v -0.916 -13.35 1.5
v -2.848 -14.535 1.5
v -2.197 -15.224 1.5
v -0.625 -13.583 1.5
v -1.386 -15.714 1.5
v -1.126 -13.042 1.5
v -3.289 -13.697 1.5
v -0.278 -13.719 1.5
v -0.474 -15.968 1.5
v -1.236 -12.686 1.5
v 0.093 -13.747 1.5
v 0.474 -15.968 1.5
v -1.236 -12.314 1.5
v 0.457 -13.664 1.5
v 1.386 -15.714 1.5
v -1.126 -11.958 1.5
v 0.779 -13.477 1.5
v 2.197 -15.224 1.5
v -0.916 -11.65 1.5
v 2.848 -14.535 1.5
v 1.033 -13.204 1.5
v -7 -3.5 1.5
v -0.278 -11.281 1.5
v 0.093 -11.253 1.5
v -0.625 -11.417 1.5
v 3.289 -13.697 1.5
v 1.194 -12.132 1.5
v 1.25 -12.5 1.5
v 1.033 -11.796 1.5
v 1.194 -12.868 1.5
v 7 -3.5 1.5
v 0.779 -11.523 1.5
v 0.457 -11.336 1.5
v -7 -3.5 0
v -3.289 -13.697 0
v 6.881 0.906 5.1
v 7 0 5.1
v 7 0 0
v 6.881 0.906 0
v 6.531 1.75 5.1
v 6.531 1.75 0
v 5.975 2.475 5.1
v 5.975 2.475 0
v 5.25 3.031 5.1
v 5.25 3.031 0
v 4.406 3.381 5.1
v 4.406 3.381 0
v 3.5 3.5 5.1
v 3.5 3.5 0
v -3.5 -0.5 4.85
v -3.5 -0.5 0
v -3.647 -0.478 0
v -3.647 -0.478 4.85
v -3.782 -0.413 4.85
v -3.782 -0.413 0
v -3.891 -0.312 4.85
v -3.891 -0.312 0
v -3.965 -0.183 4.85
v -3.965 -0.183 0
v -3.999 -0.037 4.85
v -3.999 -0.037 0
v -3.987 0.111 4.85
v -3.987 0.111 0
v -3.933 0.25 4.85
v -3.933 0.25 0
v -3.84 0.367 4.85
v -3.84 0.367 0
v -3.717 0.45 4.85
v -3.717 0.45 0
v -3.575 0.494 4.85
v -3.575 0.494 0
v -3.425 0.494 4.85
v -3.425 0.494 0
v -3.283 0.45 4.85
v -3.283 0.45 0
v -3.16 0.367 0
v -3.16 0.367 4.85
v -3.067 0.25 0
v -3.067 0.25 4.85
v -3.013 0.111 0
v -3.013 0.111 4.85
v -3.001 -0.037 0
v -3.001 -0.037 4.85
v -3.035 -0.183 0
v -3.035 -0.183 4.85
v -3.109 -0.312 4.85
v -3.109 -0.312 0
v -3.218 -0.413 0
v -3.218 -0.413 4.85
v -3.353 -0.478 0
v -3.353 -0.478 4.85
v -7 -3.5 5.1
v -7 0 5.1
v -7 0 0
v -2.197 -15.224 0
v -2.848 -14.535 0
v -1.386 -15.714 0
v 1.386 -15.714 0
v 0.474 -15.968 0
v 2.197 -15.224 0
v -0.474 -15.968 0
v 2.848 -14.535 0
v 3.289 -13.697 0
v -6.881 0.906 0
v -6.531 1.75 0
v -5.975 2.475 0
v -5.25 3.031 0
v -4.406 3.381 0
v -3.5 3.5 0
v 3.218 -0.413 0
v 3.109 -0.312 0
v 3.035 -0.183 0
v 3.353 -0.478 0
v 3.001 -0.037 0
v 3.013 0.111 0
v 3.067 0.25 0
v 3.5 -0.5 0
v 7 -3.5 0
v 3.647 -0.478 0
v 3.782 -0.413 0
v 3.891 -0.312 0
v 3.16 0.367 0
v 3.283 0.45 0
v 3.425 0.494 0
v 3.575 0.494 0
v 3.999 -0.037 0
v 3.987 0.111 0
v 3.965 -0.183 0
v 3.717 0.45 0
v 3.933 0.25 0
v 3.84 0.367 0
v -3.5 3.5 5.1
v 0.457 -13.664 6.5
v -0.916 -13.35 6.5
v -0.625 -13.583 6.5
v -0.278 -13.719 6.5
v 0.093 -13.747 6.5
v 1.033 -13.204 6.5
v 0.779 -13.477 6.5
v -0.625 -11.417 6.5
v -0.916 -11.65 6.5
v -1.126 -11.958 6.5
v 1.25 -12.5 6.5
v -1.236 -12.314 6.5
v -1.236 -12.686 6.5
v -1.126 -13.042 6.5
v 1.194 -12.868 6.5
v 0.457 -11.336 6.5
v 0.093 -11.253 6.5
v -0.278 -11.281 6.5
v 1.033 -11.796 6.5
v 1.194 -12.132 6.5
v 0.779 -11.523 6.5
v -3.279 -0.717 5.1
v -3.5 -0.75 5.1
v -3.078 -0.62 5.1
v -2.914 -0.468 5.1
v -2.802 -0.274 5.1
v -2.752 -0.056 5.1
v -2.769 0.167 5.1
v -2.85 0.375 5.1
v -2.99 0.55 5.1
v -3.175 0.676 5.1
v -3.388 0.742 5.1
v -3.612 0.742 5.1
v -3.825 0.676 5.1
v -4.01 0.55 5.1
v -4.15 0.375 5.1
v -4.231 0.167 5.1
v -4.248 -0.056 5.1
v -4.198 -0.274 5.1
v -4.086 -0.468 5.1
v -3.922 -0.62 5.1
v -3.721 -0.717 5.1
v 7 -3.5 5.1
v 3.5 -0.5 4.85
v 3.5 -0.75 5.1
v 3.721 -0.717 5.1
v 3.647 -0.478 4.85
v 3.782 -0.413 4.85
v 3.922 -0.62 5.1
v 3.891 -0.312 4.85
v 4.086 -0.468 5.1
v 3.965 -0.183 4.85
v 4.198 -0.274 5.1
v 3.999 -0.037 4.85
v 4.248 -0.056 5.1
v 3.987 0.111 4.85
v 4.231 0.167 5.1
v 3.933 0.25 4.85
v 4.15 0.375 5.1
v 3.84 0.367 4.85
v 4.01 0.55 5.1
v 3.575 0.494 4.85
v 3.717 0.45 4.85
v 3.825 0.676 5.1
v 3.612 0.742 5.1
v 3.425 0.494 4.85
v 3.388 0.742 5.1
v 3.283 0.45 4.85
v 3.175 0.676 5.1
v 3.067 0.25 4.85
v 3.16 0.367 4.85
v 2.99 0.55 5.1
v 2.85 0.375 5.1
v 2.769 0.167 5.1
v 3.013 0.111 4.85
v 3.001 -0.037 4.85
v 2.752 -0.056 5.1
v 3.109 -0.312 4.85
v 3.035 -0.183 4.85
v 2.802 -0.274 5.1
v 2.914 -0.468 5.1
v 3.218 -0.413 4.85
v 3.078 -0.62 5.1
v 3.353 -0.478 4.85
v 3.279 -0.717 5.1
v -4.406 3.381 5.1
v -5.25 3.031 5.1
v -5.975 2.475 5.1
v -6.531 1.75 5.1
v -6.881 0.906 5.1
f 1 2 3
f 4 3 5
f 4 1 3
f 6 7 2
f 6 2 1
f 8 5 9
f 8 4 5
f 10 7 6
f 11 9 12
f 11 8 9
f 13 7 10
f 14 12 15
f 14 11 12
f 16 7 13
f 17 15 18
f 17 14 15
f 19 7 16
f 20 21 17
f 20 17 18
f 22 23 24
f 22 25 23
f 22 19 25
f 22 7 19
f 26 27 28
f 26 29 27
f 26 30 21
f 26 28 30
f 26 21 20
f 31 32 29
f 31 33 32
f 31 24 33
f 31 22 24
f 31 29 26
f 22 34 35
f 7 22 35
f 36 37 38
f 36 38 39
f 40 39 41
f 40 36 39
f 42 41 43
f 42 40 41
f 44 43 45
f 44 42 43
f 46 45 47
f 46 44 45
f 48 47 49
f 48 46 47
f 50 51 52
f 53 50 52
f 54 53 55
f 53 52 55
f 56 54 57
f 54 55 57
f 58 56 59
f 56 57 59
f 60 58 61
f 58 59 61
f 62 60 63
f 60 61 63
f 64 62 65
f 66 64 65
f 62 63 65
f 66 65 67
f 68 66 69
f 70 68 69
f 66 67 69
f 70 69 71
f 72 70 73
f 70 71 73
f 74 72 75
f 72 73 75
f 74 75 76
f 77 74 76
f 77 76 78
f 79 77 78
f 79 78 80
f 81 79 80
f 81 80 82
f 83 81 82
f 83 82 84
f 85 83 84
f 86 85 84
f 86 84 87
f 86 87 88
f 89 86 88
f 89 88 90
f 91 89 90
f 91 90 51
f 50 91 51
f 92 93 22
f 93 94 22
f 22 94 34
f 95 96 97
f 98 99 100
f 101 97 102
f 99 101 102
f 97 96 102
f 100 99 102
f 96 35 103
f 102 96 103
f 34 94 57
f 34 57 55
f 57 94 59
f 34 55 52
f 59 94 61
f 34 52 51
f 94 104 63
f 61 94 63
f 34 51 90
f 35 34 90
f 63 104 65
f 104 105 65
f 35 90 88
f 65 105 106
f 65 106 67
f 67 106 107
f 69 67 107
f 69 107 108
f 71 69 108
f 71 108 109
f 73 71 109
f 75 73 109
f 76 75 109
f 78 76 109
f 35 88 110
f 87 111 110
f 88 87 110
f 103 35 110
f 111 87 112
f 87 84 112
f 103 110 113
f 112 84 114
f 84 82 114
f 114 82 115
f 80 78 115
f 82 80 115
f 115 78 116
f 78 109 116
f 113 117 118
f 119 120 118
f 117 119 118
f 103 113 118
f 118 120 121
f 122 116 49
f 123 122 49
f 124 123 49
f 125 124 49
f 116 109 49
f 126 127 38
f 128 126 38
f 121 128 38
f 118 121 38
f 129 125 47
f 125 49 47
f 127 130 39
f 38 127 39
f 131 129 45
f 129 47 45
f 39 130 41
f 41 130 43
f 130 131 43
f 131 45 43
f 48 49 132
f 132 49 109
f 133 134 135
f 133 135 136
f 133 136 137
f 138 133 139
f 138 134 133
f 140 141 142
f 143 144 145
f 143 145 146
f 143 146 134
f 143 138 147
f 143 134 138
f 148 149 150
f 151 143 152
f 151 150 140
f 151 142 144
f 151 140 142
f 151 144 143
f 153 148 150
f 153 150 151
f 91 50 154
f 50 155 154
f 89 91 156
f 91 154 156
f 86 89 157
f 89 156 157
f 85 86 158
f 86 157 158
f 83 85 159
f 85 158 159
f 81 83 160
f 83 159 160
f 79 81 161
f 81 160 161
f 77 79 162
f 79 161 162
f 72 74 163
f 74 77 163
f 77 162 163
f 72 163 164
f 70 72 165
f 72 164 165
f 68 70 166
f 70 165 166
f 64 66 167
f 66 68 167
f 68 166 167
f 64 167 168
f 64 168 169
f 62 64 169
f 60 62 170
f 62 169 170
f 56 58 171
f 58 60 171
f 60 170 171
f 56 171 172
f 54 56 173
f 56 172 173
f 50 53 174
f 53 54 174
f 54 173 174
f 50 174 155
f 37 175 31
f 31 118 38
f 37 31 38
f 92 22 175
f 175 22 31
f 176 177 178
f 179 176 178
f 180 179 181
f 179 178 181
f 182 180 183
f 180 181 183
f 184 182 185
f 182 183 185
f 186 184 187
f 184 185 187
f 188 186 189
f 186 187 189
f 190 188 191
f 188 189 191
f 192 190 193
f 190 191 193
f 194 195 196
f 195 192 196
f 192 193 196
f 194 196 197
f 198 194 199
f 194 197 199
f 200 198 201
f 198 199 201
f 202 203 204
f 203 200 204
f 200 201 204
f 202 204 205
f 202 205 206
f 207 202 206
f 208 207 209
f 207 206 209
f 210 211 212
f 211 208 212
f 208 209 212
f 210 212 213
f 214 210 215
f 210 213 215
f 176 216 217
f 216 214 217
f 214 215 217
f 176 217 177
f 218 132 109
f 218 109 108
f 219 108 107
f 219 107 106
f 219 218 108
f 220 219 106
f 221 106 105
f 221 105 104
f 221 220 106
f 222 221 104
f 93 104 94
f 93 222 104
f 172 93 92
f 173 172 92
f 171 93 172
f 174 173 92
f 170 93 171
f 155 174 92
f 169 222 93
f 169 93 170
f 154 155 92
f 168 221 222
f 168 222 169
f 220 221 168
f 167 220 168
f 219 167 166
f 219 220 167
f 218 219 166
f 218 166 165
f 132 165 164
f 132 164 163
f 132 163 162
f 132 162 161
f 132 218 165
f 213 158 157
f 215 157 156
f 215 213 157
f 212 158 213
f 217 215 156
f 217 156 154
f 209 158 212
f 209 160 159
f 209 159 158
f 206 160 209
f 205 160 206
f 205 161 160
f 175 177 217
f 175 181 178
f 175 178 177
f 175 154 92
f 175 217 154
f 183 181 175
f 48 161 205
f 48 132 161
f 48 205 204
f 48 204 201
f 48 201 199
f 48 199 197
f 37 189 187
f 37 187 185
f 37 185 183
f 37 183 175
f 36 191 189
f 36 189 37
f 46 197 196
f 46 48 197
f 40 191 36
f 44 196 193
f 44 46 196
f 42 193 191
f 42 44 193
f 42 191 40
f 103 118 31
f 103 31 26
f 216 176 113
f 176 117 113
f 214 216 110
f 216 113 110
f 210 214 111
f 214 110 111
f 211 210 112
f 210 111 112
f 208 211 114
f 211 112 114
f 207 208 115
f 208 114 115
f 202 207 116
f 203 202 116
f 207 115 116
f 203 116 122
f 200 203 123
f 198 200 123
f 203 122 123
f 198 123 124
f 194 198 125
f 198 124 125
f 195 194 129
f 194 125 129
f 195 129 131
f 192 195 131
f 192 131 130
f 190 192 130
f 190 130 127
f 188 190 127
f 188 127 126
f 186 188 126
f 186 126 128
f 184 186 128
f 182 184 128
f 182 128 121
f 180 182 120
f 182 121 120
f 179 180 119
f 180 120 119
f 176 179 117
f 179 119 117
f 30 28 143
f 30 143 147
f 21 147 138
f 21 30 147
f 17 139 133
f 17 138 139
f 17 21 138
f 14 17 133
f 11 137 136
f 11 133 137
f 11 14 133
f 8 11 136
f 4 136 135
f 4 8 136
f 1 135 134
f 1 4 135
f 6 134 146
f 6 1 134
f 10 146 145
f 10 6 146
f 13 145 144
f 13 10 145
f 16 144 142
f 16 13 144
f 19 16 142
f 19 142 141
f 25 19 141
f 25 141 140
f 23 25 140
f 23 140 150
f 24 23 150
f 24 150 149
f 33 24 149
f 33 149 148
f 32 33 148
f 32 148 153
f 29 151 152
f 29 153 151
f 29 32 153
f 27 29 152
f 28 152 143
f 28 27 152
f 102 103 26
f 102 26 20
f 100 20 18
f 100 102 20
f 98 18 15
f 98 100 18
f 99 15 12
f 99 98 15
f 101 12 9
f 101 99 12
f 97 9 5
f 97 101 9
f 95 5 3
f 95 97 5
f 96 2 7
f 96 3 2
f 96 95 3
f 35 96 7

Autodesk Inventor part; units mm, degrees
ref_plane "YZ Plane" through (0, 0, 0) normal (1, 0, 0) x (0, 1, 0)
ref_plane "XZ Plane" through (0, 0, 0) normal (0, 1, 0) x (-1, 0, 0)
ref_plane "XY Plane" through (0, 0, 0) normal (0, 0, 1) x (1, 0, 0)
sketch "Эскиз1" plane through (0, 0, 0) normal (0, 0, 1) x (1, 0, 0)
  line L0 (-7, -3.5) -> (7, -3.5) construction
  line L1 (7, -3.5) -> (7, 3.5)
  line L2 (7, 3.5) -> (-7, 3.5)
  line L3 (-7, 3.5) -> (-7, -3.5)
  line L4 (-7, -3.5) -> (7, 3.5) construction
  line L5 (7, -3.5) -> (-7, 3.5) construction
  line L6 (0, -3.5) -> (0, -12.5) construction
  line L7 (-7, -3.5) -> (-3.289, -13.697)
  line L8 (7, -3.5) -> (3.289, -13.697)
  arc A0 (-3.289, -13.697) -> (3.289, -13.697) centre (0, -12.5) ccw
  point P0 (0, 0)
  point P1 (0, 0)
  point P2 (0, 0)
  point P3 (0, 0)
  dimension "d0" = 14
  dimension "d1" = 7
  dimension "d4" = 9
  dimension "d5" = 3.5
extrude "Выдавливание1" add sketch "Эскиз1" along normal blind 1.5
sketch "Эскиз4" plane through (0, 0, 1.5) normal (0, 0, 1) x (1, 0, 0)
  line L0 (7, 3.5) -> (-7, 3.5) projected
  line L1 (7, -3.5) -> (7, 3.5) projected
  line L2 (-7, 3.5) -> (-7, -3.5) projected
  line L3 (-7, -3.5) -> (7, -3.5)
  point P0 (0, 0)
extrude "Выдавливание6" add sketch "Эскиз4" along normal blind 3.6
sketch "Эскиз2" plane through (0, 0, 1.5) normal (0, 0, 1) x (1, 0, 0)
  arc A0 (-3.289, -13.697) -> (3.289, -13.697) centre (0, -12.5) ccw construction
  circle A1 centre (0, -12.5) radius 1.25
  point P0 (0, 0)
  dimension "d8" = 2.5
extrude "Выдавливание9" add sketch "Эскиз2" along normal blind 5
fillet "Сопряжение1" radius 3.5 2 edges at (7, 3.5, 2.55) (-7, 3.5, 2.55)
sketch "Эскиз5" plane through (0, 0, 5.1) normal (0, 0, 1) x (1, 0, 0)
  circle A0 centre (0, -9.5) radius 1.5 construction
  line L0 (7, -3.5) -> (-7, -3.5) construction
  line L1 (0, -3.5) -> (0, 3.5) construction
  line L2 (-7, 3.5) -> (7, 3.5) construction
  circle A1 centre (3.5, 0) radius 0.5
  line L3 (3.5, 3.5) -> (3.5, 0) construction
  line L4 (3.5, 0) -> (0, 0) construction
  circle A2 centre (-3.5, 0) radius 0.5
  dimension "d34" = 1
hole "Отверстие1" at (-3.5, 0, 5.1) at (3.5, 0, 5.1) direction (0, 0, -1) diameter 1 end through all countersink diameter 1.5 countersink angle 90
properties part number "переходник"
